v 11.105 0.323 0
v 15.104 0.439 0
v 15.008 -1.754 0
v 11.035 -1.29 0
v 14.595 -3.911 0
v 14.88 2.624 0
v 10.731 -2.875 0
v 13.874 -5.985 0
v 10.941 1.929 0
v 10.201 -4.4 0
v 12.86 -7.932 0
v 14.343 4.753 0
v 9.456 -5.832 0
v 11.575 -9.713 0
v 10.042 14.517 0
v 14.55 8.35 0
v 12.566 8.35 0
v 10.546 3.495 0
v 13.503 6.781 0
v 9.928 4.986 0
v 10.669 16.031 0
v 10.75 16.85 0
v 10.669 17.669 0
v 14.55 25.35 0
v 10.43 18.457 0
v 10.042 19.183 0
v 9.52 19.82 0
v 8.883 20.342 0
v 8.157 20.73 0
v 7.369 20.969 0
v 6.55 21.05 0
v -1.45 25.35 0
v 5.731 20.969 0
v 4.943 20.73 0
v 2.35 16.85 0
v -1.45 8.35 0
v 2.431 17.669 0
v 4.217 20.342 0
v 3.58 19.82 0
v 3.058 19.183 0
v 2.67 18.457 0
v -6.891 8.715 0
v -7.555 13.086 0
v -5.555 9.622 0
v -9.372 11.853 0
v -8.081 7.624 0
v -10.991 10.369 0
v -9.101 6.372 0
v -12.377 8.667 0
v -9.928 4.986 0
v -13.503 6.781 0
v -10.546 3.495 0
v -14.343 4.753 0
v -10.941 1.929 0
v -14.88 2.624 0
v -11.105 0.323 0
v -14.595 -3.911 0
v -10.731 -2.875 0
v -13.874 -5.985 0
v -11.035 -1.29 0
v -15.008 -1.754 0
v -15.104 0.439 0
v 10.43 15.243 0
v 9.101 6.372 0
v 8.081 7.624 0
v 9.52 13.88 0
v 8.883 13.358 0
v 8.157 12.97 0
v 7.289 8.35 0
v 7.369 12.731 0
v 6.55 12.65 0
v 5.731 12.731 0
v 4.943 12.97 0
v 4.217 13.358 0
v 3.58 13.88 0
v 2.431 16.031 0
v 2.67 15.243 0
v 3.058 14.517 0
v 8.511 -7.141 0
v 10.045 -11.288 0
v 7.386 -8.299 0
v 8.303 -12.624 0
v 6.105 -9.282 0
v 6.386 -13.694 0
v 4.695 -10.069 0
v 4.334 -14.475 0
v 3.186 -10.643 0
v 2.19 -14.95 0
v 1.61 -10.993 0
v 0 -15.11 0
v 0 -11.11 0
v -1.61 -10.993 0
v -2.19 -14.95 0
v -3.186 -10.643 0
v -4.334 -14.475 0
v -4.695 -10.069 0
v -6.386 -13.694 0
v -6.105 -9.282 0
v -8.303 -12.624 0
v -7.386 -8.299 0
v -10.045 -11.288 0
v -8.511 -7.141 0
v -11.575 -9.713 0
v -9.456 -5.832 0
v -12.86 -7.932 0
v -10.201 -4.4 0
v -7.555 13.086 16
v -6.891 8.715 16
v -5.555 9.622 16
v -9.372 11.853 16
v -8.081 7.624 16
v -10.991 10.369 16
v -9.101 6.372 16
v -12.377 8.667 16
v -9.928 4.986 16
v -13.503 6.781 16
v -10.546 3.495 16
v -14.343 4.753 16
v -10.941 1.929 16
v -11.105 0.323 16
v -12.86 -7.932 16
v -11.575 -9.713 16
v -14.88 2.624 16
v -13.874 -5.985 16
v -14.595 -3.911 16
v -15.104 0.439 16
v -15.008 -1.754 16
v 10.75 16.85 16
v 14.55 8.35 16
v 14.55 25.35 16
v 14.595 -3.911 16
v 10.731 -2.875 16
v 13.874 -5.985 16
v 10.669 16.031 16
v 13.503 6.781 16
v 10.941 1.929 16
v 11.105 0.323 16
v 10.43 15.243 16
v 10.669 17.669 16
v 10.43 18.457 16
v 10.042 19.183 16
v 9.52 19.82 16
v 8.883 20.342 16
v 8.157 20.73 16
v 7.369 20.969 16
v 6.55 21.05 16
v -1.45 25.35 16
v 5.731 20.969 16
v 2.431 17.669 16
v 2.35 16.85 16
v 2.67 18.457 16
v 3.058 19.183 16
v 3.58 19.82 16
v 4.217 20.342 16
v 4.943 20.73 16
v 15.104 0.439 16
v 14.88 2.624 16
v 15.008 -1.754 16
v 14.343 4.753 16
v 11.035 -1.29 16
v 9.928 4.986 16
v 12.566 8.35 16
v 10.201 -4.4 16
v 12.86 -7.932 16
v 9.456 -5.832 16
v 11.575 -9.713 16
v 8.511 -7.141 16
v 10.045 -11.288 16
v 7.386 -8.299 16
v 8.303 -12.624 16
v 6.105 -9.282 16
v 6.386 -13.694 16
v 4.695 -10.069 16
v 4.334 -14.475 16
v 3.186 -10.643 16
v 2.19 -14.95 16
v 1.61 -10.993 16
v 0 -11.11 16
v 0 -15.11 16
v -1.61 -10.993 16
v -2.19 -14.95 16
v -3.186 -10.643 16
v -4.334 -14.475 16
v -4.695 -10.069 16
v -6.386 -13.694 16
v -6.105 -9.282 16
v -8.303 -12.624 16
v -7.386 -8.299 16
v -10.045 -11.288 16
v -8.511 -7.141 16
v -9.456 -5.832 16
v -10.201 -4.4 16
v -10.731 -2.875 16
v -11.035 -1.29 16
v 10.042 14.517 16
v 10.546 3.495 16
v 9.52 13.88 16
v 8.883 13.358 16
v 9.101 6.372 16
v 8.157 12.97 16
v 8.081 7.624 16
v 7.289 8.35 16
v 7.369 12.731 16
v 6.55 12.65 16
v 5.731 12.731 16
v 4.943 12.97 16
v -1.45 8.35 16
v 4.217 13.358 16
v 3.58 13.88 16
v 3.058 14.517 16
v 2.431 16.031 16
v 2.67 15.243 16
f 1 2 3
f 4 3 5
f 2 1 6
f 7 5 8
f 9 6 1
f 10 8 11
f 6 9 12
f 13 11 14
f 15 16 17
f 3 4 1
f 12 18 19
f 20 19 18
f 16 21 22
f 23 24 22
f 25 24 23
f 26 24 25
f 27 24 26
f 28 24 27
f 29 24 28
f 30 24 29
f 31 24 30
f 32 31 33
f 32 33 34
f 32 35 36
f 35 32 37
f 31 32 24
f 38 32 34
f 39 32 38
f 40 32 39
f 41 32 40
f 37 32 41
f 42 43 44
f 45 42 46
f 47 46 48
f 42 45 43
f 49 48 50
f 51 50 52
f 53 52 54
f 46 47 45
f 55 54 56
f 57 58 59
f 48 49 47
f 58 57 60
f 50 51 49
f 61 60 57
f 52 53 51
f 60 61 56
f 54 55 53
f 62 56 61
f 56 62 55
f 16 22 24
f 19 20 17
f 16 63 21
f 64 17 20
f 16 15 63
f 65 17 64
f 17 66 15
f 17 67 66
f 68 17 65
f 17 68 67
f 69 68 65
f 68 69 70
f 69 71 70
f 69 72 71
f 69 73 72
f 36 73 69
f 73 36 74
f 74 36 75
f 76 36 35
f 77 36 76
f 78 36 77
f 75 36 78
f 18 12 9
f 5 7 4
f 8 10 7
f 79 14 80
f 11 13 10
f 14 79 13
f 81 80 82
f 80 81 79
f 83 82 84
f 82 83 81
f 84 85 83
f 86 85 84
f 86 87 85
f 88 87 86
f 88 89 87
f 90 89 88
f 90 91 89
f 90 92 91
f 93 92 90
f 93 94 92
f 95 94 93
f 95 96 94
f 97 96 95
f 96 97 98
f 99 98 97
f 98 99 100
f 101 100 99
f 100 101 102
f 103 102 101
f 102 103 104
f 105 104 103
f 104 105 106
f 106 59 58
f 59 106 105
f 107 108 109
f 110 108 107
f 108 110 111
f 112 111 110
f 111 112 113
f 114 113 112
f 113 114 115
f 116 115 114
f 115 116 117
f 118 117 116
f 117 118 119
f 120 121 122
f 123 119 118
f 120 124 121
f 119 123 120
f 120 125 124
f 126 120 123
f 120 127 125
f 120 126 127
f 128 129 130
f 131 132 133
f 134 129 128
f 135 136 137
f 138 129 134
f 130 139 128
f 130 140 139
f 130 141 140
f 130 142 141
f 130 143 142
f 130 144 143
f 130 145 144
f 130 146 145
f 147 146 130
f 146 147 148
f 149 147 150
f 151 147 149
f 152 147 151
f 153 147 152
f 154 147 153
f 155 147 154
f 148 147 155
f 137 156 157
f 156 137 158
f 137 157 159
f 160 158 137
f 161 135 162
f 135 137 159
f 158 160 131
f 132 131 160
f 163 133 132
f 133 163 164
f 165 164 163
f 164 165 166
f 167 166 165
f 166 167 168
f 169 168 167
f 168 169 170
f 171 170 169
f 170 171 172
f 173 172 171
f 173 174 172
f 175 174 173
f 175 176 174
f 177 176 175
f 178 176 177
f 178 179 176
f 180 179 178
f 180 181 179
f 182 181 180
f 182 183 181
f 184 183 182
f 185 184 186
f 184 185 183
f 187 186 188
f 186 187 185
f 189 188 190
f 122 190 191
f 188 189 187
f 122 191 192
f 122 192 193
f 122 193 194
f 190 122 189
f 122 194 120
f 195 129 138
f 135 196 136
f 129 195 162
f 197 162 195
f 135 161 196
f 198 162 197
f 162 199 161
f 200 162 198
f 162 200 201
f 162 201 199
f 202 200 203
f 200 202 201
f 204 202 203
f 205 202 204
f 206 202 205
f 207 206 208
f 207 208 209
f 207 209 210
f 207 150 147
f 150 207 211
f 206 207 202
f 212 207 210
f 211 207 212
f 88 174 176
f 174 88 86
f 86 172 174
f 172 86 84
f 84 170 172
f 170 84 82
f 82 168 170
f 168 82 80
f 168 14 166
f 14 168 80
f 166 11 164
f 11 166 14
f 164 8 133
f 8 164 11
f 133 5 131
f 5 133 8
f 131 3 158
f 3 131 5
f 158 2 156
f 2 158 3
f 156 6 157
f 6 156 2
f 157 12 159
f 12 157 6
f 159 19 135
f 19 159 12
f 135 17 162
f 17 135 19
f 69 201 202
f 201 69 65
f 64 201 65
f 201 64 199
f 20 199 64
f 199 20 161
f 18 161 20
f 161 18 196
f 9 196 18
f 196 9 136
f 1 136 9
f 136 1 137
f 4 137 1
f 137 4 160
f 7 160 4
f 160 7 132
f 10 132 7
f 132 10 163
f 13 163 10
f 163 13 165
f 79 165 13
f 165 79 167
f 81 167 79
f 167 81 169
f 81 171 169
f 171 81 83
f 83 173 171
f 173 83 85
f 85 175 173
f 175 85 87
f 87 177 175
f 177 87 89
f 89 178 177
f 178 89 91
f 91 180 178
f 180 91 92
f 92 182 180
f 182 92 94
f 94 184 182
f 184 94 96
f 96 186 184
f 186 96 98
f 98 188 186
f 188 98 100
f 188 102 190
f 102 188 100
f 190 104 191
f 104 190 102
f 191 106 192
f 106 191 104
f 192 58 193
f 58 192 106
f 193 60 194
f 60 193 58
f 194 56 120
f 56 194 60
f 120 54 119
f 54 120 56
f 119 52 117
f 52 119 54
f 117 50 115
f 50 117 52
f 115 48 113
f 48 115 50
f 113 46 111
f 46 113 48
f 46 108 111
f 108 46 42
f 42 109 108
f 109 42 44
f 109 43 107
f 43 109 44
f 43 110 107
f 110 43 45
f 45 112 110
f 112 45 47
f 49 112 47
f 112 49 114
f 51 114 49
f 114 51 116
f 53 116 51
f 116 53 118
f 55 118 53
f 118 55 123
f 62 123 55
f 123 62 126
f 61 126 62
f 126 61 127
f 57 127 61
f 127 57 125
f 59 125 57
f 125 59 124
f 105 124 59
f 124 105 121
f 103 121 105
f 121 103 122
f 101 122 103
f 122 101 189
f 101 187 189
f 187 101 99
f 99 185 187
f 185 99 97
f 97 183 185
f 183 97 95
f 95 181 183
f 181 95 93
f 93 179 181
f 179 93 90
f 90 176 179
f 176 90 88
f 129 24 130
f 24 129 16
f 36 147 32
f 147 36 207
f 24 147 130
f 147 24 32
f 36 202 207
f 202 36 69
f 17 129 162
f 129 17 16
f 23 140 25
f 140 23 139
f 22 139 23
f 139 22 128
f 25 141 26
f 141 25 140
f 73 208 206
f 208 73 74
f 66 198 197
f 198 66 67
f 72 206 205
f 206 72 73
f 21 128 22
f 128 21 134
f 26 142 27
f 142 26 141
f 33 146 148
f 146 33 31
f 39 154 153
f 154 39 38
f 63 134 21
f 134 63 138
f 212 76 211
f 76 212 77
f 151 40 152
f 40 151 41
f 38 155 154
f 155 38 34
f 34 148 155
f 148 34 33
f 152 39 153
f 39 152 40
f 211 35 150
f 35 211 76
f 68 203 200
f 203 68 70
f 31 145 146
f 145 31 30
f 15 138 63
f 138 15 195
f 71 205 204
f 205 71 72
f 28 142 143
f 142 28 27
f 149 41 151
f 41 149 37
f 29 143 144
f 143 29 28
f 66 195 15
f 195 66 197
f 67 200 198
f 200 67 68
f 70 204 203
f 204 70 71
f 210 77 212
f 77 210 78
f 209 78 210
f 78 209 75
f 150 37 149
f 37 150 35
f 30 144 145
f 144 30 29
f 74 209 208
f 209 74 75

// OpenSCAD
$fn = 32;

// ----------------------------------------------------------------------
// Pipe clamp: 30.22 mm ring, 4 mm wall, 16 mm wide
// ----------------------------------------------------------------------

// --- parameters (mm) ---
outer_r = 15.11;          // clamp outside radius
inner_r = 11.11;          // pipe bore radius
band = 4;                 // band thickness
clamp_w = 16;             // clamp width
opening = 60;             // opening angle between the ends
lug_w = 16;               // lug width
lug_len = 17;             // lug length
bolt_d = 8.4;             // bolt hole

clamp_profile = [[-7.555, 13.086], [-9.372, 11.853], [-10.991, 10.369], [-12.377, 8.667], [-13.503, 6.781], [-14.343, 4.753], [-14.88, 2.624], [-15.104, 0.439], [-15.008, -1.754], [-14.595, -3.911], [-13.874, -5.985], [-12.86, -7.932], [-11.575, -9.713], [-10.045, -11.288], [-8.303, -12.624], [-6.386, -13.694], [-4.334, -14.475], [-2.19, -14.95], [0, -15.11], [2.19, -14.95], [4.334, -14.475], [6.386, -13.694], [8.303, -12.624], [10.045, -11.288], [11.575, -9.713], [12.86, -7.932], [13.874, -5.985], [14.595, -3.911], [15.008, -1.754], [15.104, 0.439], [14.88, 2.624], [14.343, 4.753], [13.503, 6.781], [12.377, 8.667], [10.991, 10.369], [9.372, 11.853], [7.555, 13.086], [5.555, 9.622], [6.891, 8.715], [8.081, 7.624], [9.101, 6.372], [9.928, 4.986], [10.546, 3.495], [10.941, 1.929], [11.105, 0.323], [11.035, -1.29], [10.731, -2.875], [10.201, -4.4], [9.456, -5.832], [8.511, -7.141], [7.386, -8.299], [6.105, -9.282], [4.695, -10.069], [3.186, -10.643], [1.61, -10.993], [0, -11.11], [-1.61, -10.993], [-3.186, -10.643], [-4.695, -10.069], [-6.105, -9.282], [-7.386, -8.299], [-8.511, -7.141], [-9.456, -5.832], [-10.201, -4.4], [-10.731, -2.875], [-11.035, -1.29], [-11.105, 0.323], [-10.941, 1.929], [-10.546, 3.495], [-9.928, 4.986], [-9.101, 6.372], [-8.081, 7.624], [-6.891, 8.715], [-5.555, 9.622]];

difference() {
  union() {
    linear_extrude(height = clamp_w) polygon(clamp_profile);
    /* bolt lug on the other end */
    translate([-1.45, 8.35, 0]) cube([lug_w, 17, clamp_w]);
  }
  translate([6.55, 16.85, -2.5]) cylinder(h = clamp_w + 5, d = bolt_d);
}
